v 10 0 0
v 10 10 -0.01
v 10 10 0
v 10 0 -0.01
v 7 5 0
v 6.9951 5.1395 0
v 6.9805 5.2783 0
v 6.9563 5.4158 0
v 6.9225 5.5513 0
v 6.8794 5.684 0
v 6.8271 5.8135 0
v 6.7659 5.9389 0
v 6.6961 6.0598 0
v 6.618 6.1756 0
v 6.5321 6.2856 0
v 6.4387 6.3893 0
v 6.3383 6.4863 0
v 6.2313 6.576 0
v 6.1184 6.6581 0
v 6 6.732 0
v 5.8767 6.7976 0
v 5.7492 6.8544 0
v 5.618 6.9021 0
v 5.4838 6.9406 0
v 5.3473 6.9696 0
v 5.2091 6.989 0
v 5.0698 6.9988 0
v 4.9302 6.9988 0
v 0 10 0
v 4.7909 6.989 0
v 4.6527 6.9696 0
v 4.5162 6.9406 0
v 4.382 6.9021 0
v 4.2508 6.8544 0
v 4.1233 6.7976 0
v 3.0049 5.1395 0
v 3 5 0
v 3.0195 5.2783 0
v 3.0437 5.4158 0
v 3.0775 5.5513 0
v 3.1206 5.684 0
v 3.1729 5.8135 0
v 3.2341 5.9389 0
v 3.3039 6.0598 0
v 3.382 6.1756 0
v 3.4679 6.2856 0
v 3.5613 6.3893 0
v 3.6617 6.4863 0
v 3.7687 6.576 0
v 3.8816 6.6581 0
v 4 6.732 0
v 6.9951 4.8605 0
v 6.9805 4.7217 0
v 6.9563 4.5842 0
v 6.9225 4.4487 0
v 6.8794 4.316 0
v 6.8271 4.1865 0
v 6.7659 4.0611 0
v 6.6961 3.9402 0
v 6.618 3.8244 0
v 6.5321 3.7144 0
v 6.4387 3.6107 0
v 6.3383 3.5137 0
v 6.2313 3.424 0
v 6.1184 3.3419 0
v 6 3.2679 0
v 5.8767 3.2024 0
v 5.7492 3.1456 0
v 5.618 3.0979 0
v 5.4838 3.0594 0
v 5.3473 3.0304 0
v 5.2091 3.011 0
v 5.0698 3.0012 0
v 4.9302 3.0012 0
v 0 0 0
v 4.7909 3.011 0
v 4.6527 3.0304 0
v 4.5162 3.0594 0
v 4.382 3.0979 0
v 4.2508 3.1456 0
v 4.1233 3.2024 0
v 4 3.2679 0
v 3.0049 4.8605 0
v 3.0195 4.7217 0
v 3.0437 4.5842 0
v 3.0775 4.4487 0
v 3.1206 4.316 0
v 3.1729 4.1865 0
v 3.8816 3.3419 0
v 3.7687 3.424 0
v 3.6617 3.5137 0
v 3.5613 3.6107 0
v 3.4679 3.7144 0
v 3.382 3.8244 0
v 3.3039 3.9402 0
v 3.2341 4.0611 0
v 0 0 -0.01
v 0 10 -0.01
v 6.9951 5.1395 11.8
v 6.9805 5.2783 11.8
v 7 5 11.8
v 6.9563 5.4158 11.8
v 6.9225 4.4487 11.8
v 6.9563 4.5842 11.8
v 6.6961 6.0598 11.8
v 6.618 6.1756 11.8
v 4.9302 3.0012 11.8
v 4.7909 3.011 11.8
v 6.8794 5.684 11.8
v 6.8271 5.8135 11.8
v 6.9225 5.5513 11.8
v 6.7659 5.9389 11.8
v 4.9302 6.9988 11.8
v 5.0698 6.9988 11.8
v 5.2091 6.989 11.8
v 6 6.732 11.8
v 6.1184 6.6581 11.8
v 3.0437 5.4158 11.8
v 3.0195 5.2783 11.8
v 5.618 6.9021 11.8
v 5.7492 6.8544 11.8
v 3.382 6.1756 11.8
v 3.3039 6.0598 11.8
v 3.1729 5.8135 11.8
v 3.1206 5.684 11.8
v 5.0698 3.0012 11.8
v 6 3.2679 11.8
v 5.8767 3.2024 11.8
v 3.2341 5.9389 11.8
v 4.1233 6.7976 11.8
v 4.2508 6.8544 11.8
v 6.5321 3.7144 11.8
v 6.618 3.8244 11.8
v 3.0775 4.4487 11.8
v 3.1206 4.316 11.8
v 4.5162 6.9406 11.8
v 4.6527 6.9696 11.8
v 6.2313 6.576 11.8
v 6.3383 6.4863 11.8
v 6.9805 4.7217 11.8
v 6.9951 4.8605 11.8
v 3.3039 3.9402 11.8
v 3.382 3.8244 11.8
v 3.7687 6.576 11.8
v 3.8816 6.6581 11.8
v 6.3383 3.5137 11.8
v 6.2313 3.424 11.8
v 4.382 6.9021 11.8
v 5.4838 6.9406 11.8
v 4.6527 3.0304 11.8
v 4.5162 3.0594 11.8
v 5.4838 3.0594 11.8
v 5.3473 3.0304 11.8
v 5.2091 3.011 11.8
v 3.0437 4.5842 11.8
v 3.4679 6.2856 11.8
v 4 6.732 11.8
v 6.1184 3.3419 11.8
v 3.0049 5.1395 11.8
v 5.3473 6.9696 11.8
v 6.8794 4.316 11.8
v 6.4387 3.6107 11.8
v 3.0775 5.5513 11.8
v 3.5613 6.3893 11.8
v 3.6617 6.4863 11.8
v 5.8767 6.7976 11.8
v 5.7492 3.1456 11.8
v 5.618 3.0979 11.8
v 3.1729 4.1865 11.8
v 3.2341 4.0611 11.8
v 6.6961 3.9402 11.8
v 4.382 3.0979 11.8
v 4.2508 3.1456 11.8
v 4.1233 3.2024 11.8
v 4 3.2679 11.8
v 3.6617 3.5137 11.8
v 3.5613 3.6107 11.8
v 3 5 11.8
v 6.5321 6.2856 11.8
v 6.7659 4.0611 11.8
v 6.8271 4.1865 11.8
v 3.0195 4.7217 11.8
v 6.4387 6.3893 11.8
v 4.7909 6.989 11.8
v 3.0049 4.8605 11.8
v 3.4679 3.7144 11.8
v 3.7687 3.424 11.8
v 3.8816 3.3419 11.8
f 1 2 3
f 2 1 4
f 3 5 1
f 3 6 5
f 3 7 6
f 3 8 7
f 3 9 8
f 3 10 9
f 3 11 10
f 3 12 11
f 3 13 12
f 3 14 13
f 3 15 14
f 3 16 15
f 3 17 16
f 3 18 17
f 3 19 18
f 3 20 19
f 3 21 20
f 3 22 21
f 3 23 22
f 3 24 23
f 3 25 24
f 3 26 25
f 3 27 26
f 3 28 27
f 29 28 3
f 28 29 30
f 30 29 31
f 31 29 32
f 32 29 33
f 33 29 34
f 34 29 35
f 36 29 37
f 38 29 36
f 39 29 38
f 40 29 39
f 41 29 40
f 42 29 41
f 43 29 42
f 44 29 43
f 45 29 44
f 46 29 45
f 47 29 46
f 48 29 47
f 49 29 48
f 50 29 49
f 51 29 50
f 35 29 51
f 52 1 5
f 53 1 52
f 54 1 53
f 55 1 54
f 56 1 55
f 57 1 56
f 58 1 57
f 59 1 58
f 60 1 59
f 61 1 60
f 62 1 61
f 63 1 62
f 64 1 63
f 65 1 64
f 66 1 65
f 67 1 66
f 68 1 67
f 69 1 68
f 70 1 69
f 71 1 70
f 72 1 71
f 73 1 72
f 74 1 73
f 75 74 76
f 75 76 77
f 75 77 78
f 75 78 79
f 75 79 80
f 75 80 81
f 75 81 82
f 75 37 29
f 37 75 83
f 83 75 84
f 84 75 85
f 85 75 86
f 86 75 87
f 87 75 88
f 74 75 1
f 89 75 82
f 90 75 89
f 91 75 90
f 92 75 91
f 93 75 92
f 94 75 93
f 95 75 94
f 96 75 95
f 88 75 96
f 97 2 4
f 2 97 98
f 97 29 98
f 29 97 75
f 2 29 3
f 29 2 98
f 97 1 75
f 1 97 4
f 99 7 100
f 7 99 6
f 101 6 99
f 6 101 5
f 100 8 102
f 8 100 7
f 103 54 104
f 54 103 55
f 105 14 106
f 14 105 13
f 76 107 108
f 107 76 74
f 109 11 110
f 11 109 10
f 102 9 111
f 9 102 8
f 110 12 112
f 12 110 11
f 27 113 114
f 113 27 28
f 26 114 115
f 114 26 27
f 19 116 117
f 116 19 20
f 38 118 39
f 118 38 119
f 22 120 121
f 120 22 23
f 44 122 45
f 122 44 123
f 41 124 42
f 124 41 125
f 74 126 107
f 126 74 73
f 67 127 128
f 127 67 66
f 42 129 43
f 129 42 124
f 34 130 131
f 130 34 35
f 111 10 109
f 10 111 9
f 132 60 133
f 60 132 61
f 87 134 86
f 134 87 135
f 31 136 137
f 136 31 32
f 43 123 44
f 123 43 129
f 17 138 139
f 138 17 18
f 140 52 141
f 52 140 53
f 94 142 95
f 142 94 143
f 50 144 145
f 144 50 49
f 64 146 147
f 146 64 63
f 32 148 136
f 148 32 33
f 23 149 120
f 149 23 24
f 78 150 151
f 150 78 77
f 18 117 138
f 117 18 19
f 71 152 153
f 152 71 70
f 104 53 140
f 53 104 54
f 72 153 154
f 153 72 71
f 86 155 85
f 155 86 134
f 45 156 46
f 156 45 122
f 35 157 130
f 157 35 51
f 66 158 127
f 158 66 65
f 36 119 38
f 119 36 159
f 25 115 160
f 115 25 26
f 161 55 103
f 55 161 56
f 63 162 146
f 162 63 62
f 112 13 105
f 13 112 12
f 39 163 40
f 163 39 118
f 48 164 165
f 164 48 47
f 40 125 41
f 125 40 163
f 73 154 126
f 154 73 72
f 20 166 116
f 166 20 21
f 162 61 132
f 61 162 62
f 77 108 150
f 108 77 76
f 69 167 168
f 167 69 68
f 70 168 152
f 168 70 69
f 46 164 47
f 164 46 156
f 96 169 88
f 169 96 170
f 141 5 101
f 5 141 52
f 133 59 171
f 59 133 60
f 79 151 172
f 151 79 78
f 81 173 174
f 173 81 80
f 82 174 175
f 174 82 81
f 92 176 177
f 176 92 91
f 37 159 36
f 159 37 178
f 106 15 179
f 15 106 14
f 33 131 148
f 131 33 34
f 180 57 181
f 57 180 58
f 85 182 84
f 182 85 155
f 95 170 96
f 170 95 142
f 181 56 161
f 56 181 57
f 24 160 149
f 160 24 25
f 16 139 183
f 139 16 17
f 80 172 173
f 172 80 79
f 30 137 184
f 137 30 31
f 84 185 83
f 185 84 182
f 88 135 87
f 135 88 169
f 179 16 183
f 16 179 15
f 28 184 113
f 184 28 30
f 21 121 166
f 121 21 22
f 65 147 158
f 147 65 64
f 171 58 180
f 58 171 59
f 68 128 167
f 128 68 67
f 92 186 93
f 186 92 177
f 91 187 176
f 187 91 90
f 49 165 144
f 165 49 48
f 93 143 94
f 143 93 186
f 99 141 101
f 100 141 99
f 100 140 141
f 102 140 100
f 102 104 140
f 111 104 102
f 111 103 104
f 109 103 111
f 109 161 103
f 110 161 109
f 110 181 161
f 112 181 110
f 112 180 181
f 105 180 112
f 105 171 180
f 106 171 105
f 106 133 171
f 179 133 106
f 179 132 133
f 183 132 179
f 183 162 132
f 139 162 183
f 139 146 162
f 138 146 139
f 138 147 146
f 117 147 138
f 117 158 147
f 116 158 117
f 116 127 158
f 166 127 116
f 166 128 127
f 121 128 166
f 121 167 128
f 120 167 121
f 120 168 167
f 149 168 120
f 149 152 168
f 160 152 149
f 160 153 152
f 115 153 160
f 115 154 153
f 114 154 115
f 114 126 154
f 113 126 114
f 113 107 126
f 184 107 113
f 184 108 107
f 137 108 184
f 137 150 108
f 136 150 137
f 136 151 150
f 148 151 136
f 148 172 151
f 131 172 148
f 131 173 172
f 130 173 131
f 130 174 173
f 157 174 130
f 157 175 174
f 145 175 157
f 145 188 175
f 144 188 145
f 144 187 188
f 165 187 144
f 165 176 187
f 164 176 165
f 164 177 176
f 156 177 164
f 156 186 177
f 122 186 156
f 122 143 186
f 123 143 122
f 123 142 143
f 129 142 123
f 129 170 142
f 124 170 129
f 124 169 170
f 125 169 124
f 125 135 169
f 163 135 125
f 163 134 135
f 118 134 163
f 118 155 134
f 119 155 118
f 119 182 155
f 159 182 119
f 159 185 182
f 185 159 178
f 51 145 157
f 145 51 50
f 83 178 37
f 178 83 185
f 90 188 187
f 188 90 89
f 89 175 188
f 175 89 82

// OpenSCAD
// file: ../Base/Boxes.scad
// Fischertechnik Box Foundation
// Pre-designed Boxes

use <Constants.scad>

include <PlacementOptions.scad>

box190Width = 190;
box190Depth = 130;
box130Width = 130;
box130Depth = 95;
boxUsageHeight = 33.9;
boxWallThickness = 2.4;
boxBaseThickness = 1.0;

// getBoxWallThickness()
// Gets the wall thickness of a Fischertechnik Box

function getBoxWallThickness() = boxWallThickness;

// Gets the usable height of a fischertechnik box
function getBoxUsageHeight() = boxUsageHeight;

// Gets the thickness of the Fischertechnik box base.
function getBoxBaseThickness() = boxBaseThickness;

// Gets the usable inner space of a Box 190 as an x/y-list
function getBox190Space() = [
    box190Width - 2*getBoxWallThickness(), 
    box190Depth - 2*getBoxWallThickness() ];

// Imports the Fischertechnik empty box 130x190 mm and places it at position 0,0
// 190x130 are the outer sizes, the inner space is slightly smaller. Use getBox190Space() to get the inner sizes.
// This module needs the STL file "Fischertechnik Box 130x190.stl" in the library path.
// The box is positioned that the usable inner space is at the 0,0,0 position. The

module Box190() {
    translate([-getBoxWallThickness(),-getBoxWallThickness(),-getBoxBaseThickness()])
        import("Fischertechnik Box 130x190.stl", convexity=3);
}

// Gets the usable inner space of a Box 130 as an x/y-list
function getBox130Space() = [
    box130Width - 2*getBoxWallThickness(), 
    box130Depth - 2*getBoxWallThickness() ];

// Imports the Fischertechnik empty box 95x130 mm and places it at position 0,0
// 190x130 are the outer sizes, the inner space is slightly smaller. Use getBox190Space() to get the inner sizes.
// This module needs the STL file "Fischertechnik Box 95x130.stl" in the library path.
// The box is positioned that the usable inner space is at the 0,0,0 position. The

module Box130() {
    translate([-getBoxWallThickness(),-getBoxWallThickness(),-getBoxBaseThickness()])
        import("Fischertechnik Box 95x130.stl", convexity=3);
}

// Creates a web at the specified box walls
// corner 0 = LowerLeft, 1 = UpperLeft, 2 = UpperRight, 3 = LowerRight
// side 0 = LeftOfCorner, 1 = RightOfCorner
// distance = Distance in mm from the corner
// box = inner width and depth of the box (default: Box 190)
// webWidth = length of the web (default is 3 mms)
// webThickness = thickness of the web (default is 1 mm)

module BoxWeb(corner, side, distance, box=getBox190Space(), webWidth=3, webThickness=1.0) {
    sink = getBoxWallThickness()/2;

    width = (corner % 2 == 0) ? 
            (side == LeftOfCorner ? webWidth : webThickness) :
            (side == LeftOfCorner ? webThickness : webWidth);

    depth = (corner % 2 == 0) ? 
            (side == RightOfCorner ? webWidth : webThickness) :
            (side == RightOfCorner ? webThickness : webWidth);
    
    xDiff = corner == LowerLeft ? 
                (side == LeftOfCorner ? -sink : distance) :
            (corner == UpperLeft ?                
                (side == LeftOfCorner ? distance : -sink) :
            (corner == UpperRight ?
                (side == LeftOfCorner ? box.x-webWidth+sink : box.x-distance-webThickness) :
                (side == LeftOfCorner ? box.x-distance-webThickness: box.x-webWidth+sink)));

    yDiff = corner == LowerLeft ? 
                (side == RightOfCorner ? -sink : distance) :
            (corner == UpperLeft ?
                (side == RightOfCorner ? box.y-distance : box.y-webWidth+sink) :
            (corner == UpperRight ?
                (side == RightOfCorner ? box.y-webWidth+sink : box.y-distance) :
                (side == RightOfCorner ? distance : -sink)));
    
    translate([xDiff, yDiff, -getExcess()])
        cube([width, depth, boxUsageHeight + 2*getExcess()]);
}
// file: ../Base/Rotation.scad
// Fischertechnik Box Foundation
// Geometry Helpers Rotation

include <PlacementOptions.scad>

// getRotatedSpace(space, rotation=NoRotation)
// Rotates the space dependent on the specified rotation

function getRotatedSpace(space, rotation=NoRotation) = [
    (rotation == Rotate90 || rotation == Rotate270) ? space.y : space.x,
    (rotation == Rotate90 || rotation == Rotate270) ? space.x : space.y
];

// Rotates the given space around the fixed left lower corner
// space = the space the children needs as width/depth list [width,depth]
// rotation = 0 Rotate0 degrees, 1 Rotate90 degrees, 2 Rotate180 degrees, 3 Rotate270 degrees (equivalent to -90)

module RotateFix(space, rotation=Rotate0) {
    dy = (rotation == Rotate0 || rotation == Rotate270) ? 0 :
        (rotation == Rotate90) ? space.x :
        space.y;
    dx = (rotation < Rotate180) ? 0 :
        (rotation == Rotate180) ? space.x :
        space.y;
    
    translate([dx, dy, 0])
        rotate([0, 0, rotations[rotation]])
            children();
}
// file: ../Base/Alignment.scad
// Fischertechnik Box Foundation
// Geometry Helpers Alignment

include <PlacementOptions.scad>

// getAlignedX(elementWidth, spaceWidth, align=AlignRight, offset=0)
// Gets the aligned X offset of an element with the given
// width in the given space.
// elementWidth = The width of the element to positon
// spaceWidth = The space where the element should be aligned
// align = 0 AlignLeft, 1 AlignCenter, 2 AlignRight
// offset = an optional offset from the aligned position. When
// aligned left or centered, then positive values are in X direction.
// When aligned right then positive values are in negative X direction.

function getAlignedX(elementWidth, spaceWidth, align=AlignRight, offset=0) =
    (align == AlignLeft) ?
        offset :
        ((align == AlignCenter) ?
        (spaceWidth - elementWidth)/2 + offset :
        spaceWidth - offset - elementWidth);

// getAlignedY(elementDepth, spaceDepth, align=AlignTop, offset=0)
// Gets the aligned Y offset of an element with the given
// depth in the given space.
// elementDepth = The depth of the element to positon
// spaceDepth = The space where the element should be aligned
// align = 0 AlignBottom, 1 AlignCenter, 2 AlignTop
// offset = an optional offset from the aligned position. When
// aligned bottom or centered, then positive values are in Y direction.
// When aligned top then positive values are in negative Y direction.

function getAlignedY(elementDepth, spaceDepth, align=AlignTop, offset=0) =
    (align == AlignBottom) ?
        offset :
        ((align == AlignCenter) ?
        (spaceDepth - elementDepth)/2 + offset :
        spaceDepth - offset - elementDepth);
// file: ../Base/PlacementOptions.scad
// Fischertechnik Box Foundation
// Placement Options

// Alignment
NoAlign = 0;
AlignLeft = 1;
AlignBottom = 2;
AlignCenter = 3;
AlignRight = 4;
AlignTop = 5;

// Element rotation degree steps
rotations = [0, -90, -180, -270];

// Rotation
NoRotation = 0;
Rotate0 = 0;
Rotate90 = 1;
Rotate180 = 2;
Rotate270 = 3;

// Docking (seen from above)
NoDock = -1;
DockLeft = 0;
DockTop = 1;
DockRight = 2;
DockCorner = 2;
DockBottom = 3;

// Web corners
LowerLeft = 0;
UpperLeft = 1;
UpperRight = 2;
LowerRight = 3;

// Web position relative to corner
LeftOfCorner = 0;
RightOfCorner = 1;
// file: ../Base/Placement.scad
// Fischertechnik Box Foundation
// Geometry Helpers Placement

use <Constants.scad>
use <Alignment.scad>
use <Rotation.scad>
use <Boxes.scad>

include <PlacementOptions.scad>

// Place(x=0, y=0, elementSpace=[0,0], alignX=AlignLeft, alignY=AlignBottom, rotation=Rotate0, boxSpace=getBox190Space())
// Places the child at the specified position
// y = Y-Position. This is a relative position when an X aligment is specified.
// x = X-Position. This is a relative position when an Y aligment is specified.
// elementSpace = space of the element to be placed [x,y]
// alignX = -1=NoAlign, 0 AlignLeft, 1 AlignCenter, 3 AlignRight (elementSpace and boxSpace required!)
// alignY = -1=NoAlign, 2 AlignBottom, 1 AlignCenter, 4 AlignTop (elementSpace and boxSpace required!)
// rotation = 0 Rotate0 0 degrees, 1 Rotate90 90 degrees, 
// 2 Rotate180 180 degrees, 3 Rotate270 270 degrees (equivalent to -90)
// boxSpace = Inner space of the box where the placement occurs [x,y] - default is Box 190x130 inner space

module Place(x=0, y=0, elementSpace=[0,0], 
  alignX=AlignLeft, alignY=AlignBottom, 
  rotation=NoRotation, boxSpace=getBox190Space()) {

    module Position(x, y, space, rotation=Rotate0) {
        translate([x, y, 0])
            RotateFix(space, rotation)
                children(0);
    }

    space = getRotatedSpace(elementSpace, rotation);
    alignedX = getAlignedX(space.x, boxSpace.x, alignX, x);
    alignedY = getAlignedY(space.y, boxSpace.y, alignY, y);
    Position(alignedX, alignedY, elementSpace, rotation)
        children(0);
}

// Center(space=getBox130Space(), elementSpace=[0,0])
// space = Space where the children is centered. For cylinder use centered=true and no elementSpace.
// elementSpace = space of the element to be centered [x,y]

module Center(space=getBox190Space(), elementSpace=[0,0]) {
    translate([(space.x - elementSpace.x) / 2, (space.y - elementSpace.y) / 2])
        children(0);
}

// CenterHorizontal(width=0, y=0, offset=0, space=getBox130Space())
// space = Space where the children is centered. For cylinder use centered=true and no elementSpace.
// elementSpace = space of the element to be centered [x,y]

module CenterHorizontal(width=0, y=0, offset=0, space=getBox190Space()) {
    translate([(space.x - width) / 2 + offset, y])
        children(0);
}

// CenterVertical(depth=0, x=0, offset=0, space=getBox130Space())
// space = Space where the children is centered. For cylinder use centered=true and no elementSpace.
// elementSpace = space of the element to be centered [x,y]

module CenterVerticalal(depth=0, x=0, offset=0, space=getBox190Space()) {
    translate([x, (space.y - depth) / 2 + offset])
        children(0);
}
// file: ../Base/Constants.scad
// Fischertechnik Box Foundation
// Constants

// Constant values necessary for multiple elements

// Base constants
dividerThickness = 1.2;
excess = 0.01;
fragments = 90;
tolerance = 0.8;

// Gets the thickness of a divider 
function getDividerThickness() = dividerThickness;

// Gets the excess that is used to merge walls into each other
function getExcess() = excess;

// Gets amount of fragments of a cylinder
function getFragments() = fragments;

// Gets the inner tolerance of a frame to each side
function getTolerance() = tolerance;


// Fischertechnik specific constants
axisDiameter = 4;
axisBottomDiameter = axisDiameter + 1;
standardEdgeDistance = 2.5;
standardWebDistance = 11.5;
standardCornerLength = 15;
tubeWallFactor = 1.6;

// Gets axis diameter
function getAxisDiameter() = axisDiameter;

// Gets axis bottom diameter for thicker part at the bottom
function getAxisBottomDiameter() = axisBottomDiameter;

// gets the standard distance to the wall of the box for dockable frames with webs
function getStandardEdgeDistance() = standardEdgeDistance;

// gets the standard distance of each web to the corner of the dockable frame
function getStandardWebDistance() = standardWebDistance;

// gets the standard length of the corner walls of a dockable frame
function getStandardCornerLength() = standardCornerLength;

// gets the wall thickness of a tube.
function getTubeWallThickness() = tubeWallFactor * getDividerThickness();
// main file
// Fischertechnik Box Library
// Axis for Coupling
// 31024

use <../Base/Constants.scad>
use <../ModelBase/Simple.scad>

space = 10;

// getAxisCouplingSpace()
// Gets the space the axis coupling needs as width and depth (.x and .y as a list)

function getAxisCouplingSpace() = [space, space];

// AxisCoupling()
// Standing axis for an 8 mm coupling 31024

module AxisCoupling() {
    axisHeight = 11.8;
    AxisWithSpace(axisHeight, getAxisCouplingSpace());
}

// Tests
color("lightgray")
AxisCoupling();
